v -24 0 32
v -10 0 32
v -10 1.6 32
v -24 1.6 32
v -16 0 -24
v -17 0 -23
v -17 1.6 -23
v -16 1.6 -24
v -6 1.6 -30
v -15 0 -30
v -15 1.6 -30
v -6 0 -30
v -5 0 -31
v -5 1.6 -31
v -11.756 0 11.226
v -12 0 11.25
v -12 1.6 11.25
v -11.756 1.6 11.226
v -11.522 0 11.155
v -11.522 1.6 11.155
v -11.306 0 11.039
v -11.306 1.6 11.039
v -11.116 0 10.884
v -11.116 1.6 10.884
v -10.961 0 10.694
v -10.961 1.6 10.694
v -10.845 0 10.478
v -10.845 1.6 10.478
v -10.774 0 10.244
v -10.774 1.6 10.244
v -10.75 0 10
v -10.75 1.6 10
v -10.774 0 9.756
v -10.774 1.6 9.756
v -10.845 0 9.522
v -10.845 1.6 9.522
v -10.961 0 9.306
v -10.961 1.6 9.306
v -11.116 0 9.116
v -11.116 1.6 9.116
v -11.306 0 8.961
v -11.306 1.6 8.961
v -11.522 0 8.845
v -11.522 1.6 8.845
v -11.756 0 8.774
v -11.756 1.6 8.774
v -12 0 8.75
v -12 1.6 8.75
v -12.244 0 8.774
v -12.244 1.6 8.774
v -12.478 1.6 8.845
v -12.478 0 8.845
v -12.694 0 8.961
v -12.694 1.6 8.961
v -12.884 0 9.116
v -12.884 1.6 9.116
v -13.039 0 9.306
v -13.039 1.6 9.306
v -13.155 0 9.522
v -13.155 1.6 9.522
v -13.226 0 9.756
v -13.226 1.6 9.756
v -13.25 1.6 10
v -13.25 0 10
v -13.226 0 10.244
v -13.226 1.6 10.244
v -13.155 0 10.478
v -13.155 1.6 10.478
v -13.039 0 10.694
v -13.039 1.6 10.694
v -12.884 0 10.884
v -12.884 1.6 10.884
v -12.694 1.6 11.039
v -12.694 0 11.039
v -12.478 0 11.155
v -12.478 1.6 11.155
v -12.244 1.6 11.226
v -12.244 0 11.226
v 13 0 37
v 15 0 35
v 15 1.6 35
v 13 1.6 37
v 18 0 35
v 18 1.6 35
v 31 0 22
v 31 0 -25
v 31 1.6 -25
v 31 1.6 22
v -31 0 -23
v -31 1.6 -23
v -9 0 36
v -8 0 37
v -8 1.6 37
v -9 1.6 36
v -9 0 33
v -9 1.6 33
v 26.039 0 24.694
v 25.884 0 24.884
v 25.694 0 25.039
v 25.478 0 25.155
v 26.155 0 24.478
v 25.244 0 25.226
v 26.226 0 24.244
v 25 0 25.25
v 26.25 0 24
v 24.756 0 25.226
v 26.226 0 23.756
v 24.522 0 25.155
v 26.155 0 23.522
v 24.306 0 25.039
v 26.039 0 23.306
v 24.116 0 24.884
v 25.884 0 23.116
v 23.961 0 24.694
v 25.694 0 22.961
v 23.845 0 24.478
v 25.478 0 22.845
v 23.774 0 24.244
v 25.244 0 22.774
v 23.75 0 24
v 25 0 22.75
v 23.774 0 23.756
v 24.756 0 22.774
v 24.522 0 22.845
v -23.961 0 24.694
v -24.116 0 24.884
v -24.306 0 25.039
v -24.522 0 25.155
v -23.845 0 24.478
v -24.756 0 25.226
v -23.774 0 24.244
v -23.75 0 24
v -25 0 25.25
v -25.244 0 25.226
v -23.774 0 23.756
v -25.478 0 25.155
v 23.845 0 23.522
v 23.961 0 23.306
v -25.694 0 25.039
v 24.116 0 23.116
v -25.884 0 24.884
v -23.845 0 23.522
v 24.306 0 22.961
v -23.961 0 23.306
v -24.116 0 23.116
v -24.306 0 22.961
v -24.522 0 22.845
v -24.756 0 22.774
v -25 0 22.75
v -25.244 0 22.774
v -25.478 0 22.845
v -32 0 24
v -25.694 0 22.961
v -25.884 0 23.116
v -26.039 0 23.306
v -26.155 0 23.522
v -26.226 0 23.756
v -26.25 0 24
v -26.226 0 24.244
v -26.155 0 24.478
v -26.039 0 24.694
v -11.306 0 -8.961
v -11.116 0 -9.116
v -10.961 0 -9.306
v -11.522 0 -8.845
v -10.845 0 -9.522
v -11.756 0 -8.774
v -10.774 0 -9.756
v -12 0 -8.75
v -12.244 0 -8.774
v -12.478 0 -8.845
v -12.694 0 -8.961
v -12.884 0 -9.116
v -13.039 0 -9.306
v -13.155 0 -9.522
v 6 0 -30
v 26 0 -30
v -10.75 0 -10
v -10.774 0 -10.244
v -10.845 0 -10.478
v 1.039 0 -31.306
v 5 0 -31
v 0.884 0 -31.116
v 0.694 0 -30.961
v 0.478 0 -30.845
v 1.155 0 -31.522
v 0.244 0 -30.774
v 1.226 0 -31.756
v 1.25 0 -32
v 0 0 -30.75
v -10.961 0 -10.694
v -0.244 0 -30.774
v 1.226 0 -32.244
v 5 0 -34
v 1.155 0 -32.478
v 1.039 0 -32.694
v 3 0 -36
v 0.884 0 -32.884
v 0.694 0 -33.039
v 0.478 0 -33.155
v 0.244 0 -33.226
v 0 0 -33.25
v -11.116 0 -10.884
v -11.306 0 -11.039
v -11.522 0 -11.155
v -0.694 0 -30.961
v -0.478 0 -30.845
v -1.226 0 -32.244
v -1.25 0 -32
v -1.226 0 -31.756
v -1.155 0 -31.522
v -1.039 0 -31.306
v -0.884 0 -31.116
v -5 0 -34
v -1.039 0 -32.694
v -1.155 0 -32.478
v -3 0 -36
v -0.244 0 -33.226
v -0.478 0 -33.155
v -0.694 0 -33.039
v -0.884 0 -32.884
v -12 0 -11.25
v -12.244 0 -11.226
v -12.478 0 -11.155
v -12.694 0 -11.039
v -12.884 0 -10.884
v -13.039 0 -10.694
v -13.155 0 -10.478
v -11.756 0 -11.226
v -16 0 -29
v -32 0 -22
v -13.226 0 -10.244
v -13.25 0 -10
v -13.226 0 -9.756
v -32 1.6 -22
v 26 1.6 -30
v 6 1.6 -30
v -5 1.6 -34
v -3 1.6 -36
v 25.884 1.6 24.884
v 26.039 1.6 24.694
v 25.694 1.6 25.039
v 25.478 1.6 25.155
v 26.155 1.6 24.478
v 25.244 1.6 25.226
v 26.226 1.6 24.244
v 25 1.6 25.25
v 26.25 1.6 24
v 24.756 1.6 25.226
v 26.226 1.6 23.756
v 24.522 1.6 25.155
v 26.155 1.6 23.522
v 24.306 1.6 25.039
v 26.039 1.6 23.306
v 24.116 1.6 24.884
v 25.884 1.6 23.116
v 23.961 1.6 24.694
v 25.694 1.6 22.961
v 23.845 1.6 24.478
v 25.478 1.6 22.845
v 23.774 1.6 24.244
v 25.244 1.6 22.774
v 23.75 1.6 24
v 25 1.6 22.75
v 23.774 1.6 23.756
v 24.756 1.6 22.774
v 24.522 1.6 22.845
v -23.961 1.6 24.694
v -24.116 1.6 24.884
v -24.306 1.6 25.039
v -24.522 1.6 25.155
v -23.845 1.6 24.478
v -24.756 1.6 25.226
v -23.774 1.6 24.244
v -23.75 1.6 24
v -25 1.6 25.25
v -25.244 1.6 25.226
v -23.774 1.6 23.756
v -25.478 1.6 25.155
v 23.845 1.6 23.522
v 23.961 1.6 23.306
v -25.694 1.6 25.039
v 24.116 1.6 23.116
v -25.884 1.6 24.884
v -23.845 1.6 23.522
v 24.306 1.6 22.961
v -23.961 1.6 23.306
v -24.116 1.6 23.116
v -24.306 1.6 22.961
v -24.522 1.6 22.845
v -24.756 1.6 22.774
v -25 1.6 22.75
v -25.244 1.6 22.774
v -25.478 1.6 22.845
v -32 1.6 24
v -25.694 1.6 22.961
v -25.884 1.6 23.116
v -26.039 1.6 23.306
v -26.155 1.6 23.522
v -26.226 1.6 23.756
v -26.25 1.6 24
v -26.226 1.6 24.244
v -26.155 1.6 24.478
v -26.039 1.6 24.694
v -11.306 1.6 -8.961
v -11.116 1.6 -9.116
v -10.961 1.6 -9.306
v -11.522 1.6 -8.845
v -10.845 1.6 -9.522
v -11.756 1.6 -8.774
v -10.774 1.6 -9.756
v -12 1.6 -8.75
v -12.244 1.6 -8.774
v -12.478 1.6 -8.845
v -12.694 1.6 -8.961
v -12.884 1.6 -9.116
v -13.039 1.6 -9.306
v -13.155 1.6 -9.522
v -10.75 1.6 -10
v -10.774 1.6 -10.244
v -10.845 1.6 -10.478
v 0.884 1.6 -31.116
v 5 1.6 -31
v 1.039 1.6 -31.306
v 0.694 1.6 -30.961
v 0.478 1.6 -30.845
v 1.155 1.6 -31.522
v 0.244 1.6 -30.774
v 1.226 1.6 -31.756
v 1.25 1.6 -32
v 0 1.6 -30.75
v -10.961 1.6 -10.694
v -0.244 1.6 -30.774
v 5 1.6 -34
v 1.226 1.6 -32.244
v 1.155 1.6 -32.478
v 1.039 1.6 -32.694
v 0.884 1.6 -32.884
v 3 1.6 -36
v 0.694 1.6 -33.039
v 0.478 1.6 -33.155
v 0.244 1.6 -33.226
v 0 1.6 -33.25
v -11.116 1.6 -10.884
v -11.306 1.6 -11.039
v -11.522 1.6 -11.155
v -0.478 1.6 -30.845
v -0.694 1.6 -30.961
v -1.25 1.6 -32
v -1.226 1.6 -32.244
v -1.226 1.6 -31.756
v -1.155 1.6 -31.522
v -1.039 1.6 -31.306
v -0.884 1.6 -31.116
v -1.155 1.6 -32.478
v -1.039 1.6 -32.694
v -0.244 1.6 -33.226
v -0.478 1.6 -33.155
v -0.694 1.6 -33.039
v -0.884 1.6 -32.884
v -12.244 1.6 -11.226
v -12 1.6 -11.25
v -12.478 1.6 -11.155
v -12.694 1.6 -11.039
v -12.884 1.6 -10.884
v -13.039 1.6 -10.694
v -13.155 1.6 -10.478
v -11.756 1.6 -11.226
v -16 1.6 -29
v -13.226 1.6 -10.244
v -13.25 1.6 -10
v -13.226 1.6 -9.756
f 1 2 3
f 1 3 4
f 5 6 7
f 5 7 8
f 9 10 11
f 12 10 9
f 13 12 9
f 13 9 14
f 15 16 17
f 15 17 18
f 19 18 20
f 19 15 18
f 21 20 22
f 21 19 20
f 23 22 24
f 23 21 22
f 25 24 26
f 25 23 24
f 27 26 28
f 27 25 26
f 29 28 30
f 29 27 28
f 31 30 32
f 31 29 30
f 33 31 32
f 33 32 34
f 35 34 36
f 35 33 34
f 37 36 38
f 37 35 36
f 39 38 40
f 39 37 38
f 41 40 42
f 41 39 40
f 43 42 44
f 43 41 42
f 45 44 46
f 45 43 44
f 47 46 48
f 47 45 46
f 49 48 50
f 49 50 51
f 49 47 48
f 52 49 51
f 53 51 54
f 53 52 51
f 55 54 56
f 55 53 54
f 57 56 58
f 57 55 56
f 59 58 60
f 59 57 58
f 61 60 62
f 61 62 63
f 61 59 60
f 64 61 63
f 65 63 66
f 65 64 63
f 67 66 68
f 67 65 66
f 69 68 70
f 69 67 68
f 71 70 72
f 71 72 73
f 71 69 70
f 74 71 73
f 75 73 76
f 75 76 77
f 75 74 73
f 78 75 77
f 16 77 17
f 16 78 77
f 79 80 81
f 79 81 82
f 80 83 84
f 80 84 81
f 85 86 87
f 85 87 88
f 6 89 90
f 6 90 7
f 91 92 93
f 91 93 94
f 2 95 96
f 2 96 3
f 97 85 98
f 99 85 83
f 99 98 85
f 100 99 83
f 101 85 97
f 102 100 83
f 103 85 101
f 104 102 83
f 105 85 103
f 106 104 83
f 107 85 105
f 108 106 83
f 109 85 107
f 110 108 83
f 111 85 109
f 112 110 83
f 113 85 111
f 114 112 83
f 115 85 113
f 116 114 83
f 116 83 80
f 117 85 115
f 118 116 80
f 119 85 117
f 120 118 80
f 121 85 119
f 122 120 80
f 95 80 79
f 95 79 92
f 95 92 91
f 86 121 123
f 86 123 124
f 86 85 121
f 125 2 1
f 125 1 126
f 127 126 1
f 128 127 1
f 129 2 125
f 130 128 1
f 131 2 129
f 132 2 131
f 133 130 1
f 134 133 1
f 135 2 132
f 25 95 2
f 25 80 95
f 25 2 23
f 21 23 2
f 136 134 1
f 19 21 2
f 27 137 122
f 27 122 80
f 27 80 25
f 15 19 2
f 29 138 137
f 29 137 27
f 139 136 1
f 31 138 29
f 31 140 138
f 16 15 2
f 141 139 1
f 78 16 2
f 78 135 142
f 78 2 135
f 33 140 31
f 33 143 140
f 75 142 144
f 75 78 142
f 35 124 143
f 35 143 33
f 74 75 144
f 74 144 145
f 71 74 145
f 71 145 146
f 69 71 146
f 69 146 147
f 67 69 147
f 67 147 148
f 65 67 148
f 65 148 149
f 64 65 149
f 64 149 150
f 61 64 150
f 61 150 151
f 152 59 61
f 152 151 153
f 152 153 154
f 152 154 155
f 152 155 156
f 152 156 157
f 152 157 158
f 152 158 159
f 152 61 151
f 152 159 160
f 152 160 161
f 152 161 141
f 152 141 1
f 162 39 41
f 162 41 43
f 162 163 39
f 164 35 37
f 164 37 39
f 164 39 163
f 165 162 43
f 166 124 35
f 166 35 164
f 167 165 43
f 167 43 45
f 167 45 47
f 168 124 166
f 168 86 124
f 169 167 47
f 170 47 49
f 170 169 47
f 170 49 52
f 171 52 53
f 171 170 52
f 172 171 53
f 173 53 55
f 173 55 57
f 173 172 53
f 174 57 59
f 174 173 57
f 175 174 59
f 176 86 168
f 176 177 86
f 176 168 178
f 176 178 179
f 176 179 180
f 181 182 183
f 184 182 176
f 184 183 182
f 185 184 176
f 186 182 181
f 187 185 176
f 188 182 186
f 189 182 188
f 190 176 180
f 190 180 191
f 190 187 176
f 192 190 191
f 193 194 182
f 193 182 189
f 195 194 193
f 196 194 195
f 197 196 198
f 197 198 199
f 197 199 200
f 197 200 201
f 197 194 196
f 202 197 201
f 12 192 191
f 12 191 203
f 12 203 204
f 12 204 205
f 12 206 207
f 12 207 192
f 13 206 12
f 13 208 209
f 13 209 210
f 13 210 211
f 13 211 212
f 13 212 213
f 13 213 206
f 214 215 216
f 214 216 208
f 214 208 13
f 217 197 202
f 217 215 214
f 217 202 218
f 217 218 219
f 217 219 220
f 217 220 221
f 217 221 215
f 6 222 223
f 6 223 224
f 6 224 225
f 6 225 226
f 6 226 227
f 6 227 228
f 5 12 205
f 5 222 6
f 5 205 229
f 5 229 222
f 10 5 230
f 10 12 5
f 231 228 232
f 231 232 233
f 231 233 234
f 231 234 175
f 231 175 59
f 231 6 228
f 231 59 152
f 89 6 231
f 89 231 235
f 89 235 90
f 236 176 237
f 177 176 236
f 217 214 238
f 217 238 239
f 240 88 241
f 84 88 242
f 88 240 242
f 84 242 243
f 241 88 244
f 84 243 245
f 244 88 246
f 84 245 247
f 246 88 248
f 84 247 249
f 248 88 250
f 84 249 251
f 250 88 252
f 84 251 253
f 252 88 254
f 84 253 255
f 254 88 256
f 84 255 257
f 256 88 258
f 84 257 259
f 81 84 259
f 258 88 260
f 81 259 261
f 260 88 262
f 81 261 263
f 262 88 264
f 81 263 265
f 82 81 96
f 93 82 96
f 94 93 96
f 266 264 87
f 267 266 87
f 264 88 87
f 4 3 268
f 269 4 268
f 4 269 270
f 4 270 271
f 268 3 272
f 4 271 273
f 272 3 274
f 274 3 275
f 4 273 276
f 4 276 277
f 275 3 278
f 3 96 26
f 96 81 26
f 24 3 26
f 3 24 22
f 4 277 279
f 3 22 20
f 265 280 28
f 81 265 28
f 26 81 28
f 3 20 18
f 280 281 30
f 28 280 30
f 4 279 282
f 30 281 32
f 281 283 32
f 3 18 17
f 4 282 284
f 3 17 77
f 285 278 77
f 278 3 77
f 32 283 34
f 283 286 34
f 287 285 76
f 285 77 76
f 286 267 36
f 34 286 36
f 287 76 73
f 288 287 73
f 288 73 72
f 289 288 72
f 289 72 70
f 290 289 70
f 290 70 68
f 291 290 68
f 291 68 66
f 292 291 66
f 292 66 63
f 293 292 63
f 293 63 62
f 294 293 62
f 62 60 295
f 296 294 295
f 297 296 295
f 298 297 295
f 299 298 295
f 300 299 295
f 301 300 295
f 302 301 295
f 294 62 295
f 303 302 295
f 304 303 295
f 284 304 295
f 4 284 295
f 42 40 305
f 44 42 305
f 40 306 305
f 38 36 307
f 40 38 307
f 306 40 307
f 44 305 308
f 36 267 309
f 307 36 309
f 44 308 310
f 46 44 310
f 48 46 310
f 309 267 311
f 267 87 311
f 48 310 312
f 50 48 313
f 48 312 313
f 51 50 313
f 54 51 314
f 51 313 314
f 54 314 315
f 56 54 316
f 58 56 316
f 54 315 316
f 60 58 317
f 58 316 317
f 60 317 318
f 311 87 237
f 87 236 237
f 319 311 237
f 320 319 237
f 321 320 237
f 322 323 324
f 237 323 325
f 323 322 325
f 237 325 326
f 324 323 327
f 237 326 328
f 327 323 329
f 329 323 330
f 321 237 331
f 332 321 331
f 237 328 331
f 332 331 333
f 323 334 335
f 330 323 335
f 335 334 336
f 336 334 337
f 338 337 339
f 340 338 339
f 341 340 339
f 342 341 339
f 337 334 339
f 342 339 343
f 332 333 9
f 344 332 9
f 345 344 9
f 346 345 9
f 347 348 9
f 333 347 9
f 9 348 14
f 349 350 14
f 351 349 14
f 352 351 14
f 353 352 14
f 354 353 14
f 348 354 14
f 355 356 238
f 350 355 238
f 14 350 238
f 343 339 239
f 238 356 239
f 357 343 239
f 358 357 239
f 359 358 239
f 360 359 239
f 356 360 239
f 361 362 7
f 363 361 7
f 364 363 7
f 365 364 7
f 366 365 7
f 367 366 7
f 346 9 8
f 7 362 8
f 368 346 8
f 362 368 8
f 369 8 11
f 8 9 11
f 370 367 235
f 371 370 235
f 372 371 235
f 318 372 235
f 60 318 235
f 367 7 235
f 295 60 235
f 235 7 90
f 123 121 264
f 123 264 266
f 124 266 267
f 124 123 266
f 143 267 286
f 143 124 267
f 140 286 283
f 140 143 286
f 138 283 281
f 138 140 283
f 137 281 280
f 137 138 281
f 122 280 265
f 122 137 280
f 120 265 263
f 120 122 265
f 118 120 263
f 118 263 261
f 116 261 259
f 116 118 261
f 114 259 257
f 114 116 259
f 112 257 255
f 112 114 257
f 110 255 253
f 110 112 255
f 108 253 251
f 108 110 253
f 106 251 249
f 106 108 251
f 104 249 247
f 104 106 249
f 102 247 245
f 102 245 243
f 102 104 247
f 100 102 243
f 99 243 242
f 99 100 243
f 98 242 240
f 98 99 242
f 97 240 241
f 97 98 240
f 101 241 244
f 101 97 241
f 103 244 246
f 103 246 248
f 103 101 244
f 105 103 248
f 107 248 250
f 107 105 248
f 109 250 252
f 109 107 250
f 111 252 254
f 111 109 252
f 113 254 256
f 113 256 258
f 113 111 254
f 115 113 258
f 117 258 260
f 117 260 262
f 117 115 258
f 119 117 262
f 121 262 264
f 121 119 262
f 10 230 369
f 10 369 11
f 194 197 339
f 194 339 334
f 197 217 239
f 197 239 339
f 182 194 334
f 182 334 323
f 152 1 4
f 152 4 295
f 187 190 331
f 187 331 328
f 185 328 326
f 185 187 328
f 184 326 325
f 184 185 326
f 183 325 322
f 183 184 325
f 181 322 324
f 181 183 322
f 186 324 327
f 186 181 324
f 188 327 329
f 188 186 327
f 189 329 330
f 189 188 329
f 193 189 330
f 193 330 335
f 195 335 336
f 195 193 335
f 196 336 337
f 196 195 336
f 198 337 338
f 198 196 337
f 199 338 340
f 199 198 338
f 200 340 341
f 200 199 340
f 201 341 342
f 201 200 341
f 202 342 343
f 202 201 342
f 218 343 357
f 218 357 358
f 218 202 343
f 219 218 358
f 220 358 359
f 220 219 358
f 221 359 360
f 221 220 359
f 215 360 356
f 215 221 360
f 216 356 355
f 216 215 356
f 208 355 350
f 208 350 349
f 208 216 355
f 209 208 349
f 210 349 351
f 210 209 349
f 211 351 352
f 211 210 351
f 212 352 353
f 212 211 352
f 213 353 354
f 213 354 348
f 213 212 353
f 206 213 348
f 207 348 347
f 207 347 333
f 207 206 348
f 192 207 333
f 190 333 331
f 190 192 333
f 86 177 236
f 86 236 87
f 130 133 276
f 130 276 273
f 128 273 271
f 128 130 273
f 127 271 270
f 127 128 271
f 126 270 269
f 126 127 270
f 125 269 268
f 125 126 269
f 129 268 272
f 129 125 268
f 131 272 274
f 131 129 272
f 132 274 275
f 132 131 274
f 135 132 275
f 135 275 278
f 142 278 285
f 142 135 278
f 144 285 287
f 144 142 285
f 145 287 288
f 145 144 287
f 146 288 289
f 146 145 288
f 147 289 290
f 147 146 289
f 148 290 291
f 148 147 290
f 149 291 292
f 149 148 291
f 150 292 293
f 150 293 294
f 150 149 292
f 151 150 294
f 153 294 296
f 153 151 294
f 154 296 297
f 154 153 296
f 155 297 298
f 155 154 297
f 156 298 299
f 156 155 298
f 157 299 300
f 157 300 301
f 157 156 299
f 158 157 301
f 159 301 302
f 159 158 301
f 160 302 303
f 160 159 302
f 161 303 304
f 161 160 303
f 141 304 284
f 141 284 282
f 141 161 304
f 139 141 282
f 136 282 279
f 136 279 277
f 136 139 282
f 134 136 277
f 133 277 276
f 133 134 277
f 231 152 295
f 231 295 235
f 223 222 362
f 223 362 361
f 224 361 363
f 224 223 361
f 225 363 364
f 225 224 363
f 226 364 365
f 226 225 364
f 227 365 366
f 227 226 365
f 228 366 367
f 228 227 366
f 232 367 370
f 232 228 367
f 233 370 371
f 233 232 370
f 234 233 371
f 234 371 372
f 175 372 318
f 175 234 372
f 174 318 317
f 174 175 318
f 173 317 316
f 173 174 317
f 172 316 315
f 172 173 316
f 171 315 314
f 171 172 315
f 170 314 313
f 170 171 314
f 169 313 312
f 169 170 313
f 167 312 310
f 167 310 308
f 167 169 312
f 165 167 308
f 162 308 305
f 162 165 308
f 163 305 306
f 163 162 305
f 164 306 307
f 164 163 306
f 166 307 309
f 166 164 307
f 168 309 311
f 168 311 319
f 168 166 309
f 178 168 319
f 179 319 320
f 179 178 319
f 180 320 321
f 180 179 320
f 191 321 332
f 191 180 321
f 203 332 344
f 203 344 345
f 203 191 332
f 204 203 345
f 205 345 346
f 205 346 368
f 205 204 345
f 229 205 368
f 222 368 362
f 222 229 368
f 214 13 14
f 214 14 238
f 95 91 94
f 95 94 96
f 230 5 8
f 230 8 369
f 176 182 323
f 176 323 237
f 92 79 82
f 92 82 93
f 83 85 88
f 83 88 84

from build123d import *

# Parameters (mm, degrees)
SKETCH_1_R      = 1.25
EXTRUDE_1_DEPTH = 1.6


with BuildPart() as part:
    # Эскиз1 → Бобышка-Вытянуть1 (new body)
    with BuildSketch(Plane(origin=(0, 0, 0), x_dir=(1, 0, 0), z_dir=(0, 1, 0))):
        Polygon((-32, -24), (-32, 22), (-31, 23), (-17, 23), (-16, 24), (-16, 29), (-15, 30), (-6, 30), (-5, 31), (-5, 34), (-3, 36), (3, 36), (5, 34), (5, 31), (6, 30), (26, 30), (31, 25), (31, -22), (18, -35), (15, -35), (13, -37), (-8, -37), (-9, -36), (-9, -33), (-10, -32), (-24, -32), align=None)
        with Locations(Location((-25, -24, 0), (0, 0, 270))):
            Circle(SKETCH_1_R, mode=Mode.SUBTRACT)
        with Locations(Location((25, -24, 0), (0, 0, 90))):
            Circle(SKETCH_1_R, mode=Mode.SUBTRACT)
        with Locations(Location((0, 32, 0), (0, 0, 270))):
            Circle(SKETCH_1_R, mode=Mode.SUBTRACT)
        with Locations(Location((-12, -10, 0), (0, 0, 270))):
            Circle(SKETCH_1_R, mode=Mode.SUBTRACT)
        with Locations(Location((-12, 10, 0), (0, 0, 90))):
            Circle(SKETCH_1_R, mode=Mode.SUBTRACT)
    extrude(amount=EXTRUDE_1_DEPTH)


solid = part.part
